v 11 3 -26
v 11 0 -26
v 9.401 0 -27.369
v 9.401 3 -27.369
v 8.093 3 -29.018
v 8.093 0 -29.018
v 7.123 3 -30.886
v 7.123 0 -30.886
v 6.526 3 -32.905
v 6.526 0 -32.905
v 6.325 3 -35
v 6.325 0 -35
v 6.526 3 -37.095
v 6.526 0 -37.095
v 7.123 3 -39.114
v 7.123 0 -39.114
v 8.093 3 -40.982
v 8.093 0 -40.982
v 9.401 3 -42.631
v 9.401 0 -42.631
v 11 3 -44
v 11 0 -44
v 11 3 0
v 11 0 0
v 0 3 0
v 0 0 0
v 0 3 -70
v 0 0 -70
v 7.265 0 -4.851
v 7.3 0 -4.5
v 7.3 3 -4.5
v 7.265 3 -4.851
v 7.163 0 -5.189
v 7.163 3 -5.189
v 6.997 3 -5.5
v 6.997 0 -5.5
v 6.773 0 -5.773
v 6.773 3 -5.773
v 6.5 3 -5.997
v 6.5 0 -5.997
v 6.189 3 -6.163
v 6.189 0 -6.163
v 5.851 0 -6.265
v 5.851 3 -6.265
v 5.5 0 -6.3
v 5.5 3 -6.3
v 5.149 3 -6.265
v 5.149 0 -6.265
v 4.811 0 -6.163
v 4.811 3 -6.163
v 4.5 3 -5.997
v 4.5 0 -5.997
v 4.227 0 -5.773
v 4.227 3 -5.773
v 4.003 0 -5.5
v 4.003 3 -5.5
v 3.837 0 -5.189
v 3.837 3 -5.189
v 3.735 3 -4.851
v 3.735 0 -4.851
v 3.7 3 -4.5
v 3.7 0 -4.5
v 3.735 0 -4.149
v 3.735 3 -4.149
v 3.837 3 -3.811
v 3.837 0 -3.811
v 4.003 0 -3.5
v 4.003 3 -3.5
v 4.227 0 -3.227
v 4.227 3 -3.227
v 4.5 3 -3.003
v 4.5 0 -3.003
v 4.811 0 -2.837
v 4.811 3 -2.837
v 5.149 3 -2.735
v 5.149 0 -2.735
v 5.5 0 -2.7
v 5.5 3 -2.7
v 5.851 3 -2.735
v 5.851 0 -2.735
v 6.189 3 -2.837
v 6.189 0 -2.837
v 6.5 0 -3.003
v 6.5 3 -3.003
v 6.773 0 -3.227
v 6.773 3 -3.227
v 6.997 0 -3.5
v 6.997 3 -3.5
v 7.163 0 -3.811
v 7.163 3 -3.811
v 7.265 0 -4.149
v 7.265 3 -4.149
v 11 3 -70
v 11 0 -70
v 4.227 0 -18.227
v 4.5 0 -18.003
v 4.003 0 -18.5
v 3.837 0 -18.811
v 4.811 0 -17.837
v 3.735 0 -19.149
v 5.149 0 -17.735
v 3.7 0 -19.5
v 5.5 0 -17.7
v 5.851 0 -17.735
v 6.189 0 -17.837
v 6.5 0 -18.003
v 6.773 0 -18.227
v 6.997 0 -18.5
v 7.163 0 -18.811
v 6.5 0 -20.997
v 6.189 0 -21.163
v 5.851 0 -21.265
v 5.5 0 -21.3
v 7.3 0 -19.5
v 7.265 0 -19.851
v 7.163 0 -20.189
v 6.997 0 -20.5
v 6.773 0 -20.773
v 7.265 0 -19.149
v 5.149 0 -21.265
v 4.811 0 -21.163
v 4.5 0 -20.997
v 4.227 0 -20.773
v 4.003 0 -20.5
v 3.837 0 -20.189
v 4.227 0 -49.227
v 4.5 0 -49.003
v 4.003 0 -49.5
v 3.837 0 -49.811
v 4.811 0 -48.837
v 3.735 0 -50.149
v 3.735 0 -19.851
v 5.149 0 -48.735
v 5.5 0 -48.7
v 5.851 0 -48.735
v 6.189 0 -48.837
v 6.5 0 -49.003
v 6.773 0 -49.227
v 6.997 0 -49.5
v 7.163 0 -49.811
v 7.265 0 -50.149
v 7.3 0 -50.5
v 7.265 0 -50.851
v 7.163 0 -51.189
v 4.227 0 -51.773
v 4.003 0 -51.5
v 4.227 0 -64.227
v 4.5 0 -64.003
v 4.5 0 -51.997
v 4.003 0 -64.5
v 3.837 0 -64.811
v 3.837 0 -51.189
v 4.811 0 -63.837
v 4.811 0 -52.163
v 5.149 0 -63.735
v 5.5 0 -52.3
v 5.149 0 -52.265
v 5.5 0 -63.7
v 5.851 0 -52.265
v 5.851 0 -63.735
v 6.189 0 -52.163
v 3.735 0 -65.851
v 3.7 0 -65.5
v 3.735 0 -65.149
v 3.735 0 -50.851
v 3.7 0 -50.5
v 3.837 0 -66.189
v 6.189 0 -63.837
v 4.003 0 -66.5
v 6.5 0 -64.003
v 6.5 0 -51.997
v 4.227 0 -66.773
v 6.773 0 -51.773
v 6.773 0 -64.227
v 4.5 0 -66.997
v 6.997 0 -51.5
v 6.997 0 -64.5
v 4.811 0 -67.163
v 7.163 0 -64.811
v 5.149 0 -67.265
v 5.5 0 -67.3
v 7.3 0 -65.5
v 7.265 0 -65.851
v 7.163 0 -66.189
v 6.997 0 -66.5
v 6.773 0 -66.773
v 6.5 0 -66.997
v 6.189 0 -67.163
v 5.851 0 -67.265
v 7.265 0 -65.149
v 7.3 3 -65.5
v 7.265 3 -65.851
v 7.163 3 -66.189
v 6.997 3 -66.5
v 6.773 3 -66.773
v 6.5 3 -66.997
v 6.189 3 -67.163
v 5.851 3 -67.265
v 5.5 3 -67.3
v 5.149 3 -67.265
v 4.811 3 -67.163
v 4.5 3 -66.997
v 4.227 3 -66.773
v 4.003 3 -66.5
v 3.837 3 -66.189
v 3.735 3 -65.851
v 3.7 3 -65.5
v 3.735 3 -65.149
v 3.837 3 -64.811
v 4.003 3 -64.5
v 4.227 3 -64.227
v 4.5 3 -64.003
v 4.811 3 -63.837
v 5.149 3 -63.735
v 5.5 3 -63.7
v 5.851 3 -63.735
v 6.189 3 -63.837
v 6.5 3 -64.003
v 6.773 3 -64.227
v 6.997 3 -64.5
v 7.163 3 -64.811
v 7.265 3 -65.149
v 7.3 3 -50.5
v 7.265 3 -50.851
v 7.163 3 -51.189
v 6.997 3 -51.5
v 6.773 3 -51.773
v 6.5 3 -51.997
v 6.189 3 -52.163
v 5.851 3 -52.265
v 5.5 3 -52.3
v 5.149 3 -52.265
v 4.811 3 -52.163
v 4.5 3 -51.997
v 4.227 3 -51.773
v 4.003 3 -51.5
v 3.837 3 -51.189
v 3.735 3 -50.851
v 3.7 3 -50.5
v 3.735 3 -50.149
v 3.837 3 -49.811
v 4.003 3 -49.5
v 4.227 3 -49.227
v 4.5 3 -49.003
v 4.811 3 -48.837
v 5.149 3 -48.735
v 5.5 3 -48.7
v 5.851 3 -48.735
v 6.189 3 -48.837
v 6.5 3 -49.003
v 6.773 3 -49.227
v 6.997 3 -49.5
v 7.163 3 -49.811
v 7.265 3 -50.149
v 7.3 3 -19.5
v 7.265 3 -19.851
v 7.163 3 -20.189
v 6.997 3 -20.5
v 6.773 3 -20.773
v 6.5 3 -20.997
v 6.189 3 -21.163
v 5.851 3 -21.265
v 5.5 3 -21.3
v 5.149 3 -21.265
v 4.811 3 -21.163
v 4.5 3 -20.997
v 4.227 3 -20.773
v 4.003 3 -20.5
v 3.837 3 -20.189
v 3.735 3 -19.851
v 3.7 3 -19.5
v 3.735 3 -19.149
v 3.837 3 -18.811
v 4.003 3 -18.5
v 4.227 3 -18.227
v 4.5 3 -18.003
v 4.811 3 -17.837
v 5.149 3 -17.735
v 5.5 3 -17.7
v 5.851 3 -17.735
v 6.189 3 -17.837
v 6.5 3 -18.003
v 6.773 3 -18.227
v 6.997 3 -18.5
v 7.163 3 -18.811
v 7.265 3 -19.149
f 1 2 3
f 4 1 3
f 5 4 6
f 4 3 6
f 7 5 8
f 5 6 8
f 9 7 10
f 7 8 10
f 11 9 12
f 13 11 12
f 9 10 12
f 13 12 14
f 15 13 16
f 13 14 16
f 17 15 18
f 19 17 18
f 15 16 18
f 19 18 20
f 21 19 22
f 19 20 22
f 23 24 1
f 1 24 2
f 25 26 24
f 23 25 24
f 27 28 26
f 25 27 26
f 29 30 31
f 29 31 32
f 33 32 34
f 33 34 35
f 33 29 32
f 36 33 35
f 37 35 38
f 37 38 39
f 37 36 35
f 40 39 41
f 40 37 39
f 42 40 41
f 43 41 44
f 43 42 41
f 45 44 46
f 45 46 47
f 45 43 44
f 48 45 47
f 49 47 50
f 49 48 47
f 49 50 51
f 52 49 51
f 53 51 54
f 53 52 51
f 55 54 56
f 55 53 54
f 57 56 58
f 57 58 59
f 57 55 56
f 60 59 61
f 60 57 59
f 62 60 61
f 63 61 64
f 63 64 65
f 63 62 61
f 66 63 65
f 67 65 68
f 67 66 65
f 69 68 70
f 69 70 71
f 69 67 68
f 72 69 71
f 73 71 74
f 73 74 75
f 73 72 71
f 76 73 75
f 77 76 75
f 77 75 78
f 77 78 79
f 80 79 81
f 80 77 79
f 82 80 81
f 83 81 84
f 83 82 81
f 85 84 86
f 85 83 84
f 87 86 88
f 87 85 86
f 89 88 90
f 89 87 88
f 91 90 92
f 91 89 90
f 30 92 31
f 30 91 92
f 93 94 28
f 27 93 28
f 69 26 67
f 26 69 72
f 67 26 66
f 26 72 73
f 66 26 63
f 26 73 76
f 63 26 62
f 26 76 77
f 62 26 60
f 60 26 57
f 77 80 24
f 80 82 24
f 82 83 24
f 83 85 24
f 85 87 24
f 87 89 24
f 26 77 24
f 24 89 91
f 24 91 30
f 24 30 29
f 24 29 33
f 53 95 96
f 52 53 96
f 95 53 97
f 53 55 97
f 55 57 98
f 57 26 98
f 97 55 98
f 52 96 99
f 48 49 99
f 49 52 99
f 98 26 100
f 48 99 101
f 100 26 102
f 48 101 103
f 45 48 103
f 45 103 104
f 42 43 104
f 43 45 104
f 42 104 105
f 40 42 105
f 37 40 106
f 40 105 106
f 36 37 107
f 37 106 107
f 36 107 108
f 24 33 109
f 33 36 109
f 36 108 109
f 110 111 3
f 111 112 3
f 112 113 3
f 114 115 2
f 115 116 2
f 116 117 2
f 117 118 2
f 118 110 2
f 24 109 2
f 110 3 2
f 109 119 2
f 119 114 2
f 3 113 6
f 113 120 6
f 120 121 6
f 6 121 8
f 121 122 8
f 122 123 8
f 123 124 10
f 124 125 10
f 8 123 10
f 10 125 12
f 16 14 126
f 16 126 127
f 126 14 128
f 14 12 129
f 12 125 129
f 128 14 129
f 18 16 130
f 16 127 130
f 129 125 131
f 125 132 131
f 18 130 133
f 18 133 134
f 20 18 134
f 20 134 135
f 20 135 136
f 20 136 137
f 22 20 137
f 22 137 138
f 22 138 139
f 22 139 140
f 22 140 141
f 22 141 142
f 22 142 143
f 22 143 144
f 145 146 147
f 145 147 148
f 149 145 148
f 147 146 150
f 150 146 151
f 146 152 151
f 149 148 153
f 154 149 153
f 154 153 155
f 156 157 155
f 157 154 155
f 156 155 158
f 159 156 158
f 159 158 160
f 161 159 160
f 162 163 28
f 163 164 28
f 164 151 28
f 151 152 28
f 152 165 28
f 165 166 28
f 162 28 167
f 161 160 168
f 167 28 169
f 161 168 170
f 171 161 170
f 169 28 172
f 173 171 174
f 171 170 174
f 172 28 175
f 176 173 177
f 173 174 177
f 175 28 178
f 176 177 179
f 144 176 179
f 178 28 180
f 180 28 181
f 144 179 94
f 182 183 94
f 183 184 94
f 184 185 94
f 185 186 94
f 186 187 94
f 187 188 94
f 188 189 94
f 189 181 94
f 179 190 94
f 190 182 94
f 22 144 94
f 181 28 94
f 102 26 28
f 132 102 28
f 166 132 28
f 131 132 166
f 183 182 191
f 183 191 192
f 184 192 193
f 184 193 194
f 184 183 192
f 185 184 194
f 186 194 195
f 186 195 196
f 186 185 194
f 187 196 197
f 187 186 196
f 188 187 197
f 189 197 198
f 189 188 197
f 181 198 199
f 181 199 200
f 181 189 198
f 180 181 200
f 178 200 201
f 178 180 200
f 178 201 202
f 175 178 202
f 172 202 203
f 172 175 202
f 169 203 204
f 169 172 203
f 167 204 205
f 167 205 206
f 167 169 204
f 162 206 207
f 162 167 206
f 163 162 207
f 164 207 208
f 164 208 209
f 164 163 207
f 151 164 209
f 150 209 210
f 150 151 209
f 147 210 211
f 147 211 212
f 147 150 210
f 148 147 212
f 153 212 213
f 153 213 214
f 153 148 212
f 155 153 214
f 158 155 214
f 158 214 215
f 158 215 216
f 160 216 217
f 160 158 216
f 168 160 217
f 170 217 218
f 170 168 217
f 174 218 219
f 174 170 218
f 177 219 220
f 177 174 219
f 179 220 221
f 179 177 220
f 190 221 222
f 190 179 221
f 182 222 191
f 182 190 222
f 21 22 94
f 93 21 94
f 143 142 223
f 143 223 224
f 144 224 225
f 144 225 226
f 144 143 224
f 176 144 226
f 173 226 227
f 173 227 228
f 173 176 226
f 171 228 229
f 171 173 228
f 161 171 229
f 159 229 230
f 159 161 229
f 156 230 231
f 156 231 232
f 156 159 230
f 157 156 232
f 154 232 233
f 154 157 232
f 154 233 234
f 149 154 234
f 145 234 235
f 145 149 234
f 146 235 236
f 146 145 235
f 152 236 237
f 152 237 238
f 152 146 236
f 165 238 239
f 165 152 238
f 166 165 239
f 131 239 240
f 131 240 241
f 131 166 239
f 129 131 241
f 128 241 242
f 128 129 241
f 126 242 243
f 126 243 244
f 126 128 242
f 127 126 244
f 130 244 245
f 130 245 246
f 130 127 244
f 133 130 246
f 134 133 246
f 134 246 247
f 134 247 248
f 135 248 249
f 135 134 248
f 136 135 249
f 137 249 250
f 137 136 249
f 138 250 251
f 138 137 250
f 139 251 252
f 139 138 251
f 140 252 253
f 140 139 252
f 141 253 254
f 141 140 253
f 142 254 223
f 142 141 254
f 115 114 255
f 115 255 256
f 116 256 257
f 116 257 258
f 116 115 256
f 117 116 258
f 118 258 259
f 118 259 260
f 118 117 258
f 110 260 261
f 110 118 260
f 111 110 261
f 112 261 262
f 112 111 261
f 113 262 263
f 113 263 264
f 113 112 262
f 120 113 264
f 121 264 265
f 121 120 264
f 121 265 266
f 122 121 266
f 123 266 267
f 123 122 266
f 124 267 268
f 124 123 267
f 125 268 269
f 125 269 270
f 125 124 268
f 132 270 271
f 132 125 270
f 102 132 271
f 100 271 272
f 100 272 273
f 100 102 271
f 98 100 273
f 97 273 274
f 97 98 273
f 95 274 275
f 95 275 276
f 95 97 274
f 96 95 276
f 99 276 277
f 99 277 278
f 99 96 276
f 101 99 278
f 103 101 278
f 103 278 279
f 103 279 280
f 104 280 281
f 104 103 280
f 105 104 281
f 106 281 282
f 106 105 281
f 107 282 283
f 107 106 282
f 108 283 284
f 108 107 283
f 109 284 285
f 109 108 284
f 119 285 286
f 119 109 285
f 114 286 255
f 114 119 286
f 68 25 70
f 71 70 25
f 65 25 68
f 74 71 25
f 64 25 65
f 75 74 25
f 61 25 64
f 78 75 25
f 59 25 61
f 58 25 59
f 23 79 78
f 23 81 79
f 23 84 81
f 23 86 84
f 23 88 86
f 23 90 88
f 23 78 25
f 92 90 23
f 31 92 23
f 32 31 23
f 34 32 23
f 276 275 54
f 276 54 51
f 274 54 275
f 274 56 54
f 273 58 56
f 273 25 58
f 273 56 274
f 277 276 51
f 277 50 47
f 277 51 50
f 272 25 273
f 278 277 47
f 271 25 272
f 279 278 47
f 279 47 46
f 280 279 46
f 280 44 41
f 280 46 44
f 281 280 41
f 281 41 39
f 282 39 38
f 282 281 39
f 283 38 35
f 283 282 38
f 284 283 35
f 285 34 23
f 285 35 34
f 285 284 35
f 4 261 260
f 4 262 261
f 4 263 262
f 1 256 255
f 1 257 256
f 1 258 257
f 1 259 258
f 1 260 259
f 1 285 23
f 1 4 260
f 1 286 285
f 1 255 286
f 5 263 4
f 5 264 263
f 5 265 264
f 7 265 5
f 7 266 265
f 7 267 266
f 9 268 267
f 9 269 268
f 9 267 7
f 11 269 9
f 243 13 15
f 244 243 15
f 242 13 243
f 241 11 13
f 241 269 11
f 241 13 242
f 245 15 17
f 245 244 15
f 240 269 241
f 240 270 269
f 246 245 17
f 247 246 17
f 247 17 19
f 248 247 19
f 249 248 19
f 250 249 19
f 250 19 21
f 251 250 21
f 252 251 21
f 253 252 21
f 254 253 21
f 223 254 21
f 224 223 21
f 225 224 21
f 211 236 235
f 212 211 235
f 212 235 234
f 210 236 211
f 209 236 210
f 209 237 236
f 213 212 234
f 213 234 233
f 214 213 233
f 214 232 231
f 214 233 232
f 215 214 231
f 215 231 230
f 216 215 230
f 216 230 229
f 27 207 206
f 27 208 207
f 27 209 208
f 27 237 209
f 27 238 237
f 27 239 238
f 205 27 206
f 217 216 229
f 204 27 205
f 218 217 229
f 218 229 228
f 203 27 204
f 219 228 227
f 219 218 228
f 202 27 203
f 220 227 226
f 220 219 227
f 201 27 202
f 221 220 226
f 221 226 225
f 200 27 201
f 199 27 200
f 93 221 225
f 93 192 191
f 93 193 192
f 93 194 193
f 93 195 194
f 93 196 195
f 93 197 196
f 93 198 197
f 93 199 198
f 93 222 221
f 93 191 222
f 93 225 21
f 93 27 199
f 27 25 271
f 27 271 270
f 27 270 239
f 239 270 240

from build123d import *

# Parameters (mm, degrees)
SKETCH1_R           = 1.8
BOSS_EXTRUDE1_DEPTH = 3


with BuildPart() as part:
    # Sketch1 → Boss-Extrude1 (new body)
    with BuildSketch(Plane(origin=(0, 0, 0), x_dir=(1, 0, 0), z_dir=(0, 1, 0))):
        with BuildLine():
            Line((11, 44), (11, 70))
            Line((11, 70), (0, 70))
            Line((0, 70), (0, 0))
            Line((0, 0), (11, 0))
            Line((11, 0), (11, 26))
            ThreePointArc((11, 26), (6.32455532, 35), (11, 44))
        make_face()
        with Locations((5.5, 65.5)):
            Circle(SKETCH1_R, mode=Mode.SUBTRACT)
        with Locations((5.5, 4.5)):
            Circle(SKETCH1_R, mode=Mode.SUBTRACT)
        with Locations((5.5, 19.5)):
            Circle(SKETCH1_R, mode=Mode.SUBTRACT)
        with Locations((5.5, 50.5)):
            Circle(SKETCH1_R, mode=Mode.SUBTRACT)
    extrude(amount=BOSS_EXTRUDE1_DEPTH)


solid = part.part
